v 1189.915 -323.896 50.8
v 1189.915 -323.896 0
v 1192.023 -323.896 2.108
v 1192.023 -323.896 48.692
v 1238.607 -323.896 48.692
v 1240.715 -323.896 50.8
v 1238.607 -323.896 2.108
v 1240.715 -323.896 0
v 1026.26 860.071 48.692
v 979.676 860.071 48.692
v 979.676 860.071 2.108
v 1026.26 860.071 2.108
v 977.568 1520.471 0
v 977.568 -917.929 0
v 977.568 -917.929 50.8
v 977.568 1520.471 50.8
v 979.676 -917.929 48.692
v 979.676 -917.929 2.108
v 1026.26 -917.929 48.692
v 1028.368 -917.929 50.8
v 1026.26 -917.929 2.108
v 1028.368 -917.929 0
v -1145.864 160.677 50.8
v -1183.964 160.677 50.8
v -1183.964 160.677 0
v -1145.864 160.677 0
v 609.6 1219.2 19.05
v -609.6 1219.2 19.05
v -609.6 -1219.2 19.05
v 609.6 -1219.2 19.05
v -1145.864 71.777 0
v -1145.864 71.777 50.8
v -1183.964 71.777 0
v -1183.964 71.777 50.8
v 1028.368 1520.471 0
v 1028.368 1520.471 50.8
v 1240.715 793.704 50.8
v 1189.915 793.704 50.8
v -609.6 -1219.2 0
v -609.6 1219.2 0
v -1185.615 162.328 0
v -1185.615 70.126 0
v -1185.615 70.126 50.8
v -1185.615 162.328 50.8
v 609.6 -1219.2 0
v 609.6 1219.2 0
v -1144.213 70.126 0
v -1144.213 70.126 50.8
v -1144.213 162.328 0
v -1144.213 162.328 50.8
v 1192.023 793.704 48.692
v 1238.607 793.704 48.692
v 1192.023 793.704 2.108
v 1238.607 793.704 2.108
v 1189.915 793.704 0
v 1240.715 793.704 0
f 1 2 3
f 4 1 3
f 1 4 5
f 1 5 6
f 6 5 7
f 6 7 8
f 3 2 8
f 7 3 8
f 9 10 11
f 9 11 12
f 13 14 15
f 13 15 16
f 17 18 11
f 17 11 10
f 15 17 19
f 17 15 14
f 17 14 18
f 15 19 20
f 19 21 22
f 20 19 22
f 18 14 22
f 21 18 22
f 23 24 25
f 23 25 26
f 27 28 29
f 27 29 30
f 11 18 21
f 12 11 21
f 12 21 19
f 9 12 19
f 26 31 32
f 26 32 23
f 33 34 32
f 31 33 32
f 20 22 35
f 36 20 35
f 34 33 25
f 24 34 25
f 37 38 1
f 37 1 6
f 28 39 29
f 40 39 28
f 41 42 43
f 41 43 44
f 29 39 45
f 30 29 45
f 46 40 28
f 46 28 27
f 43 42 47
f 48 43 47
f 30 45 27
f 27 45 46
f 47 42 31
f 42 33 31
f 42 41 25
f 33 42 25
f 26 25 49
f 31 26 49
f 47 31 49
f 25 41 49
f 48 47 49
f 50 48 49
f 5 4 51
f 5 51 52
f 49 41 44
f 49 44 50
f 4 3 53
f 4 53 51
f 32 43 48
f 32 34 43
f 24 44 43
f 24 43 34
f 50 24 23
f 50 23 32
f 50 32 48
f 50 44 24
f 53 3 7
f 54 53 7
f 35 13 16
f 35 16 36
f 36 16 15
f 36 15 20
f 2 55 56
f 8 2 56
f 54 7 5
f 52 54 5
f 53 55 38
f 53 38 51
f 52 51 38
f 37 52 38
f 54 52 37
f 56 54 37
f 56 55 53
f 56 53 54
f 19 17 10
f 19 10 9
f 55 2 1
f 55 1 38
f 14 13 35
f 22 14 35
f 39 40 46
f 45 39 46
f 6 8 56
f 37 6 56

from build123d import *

# Parameters (mm, degrees)
F0_W     = 1219.2
F0_H     = 2438.4
F1_DEPTH = 19.05
F2_W     = 41.402
F2_H     = 92.202
F2_W_2   = 38.1
F2_H_2   = 88.9
F3_DEPTH = 50.8
F4_W     = 50.8
F4_H     = 2438.4
F4_H_2   = 1117.6
F5_DEPTH = 50.8
F6_W     = 46.5836
F6_H     = 46.5836
F7_DEPTH = 1778
F8_W     = 46.5836
F8_H     = 46.5836
F9_DEPTH = 1244.6


with BuildPart() as f1:
    # F0 (on Top) → F1 (new body)
    with BuildSketch(Plane.XY):
        Rectangle(F0_W, F0_H)
    extrude(amount=F1_DEPTH)


with BuildPart() as f3:
    # F2 (on Top) → F3 (new body)
    with BuildSketch(Plane.XY):
        with Locations((-1164.913838, 116.226979)):
            Rectangle(F2_W, F2_H)
        with Locations((-1164.913838, 116.226979)):
            Rectangle(F2_W_2, F2_H_2, mode=Mode.SUBTRACT)
    extrude(amount=F3_DEPTH)


with BuildPart() as f5:
    # F4 (on Top) → F5 (new body)
    with BuildSketch(Plane.XY):
        with Locations((1002.968233, 301.271483)):
            Rectangle(F4_W, F4_H)
        with Locations((1215.314906, 234.904307)):
            Rectangle(F4_W, F4_H_2)
    extrude(amount=F5_DEPTH)

    # F6 (on face) → F7 (cut)
    with BuildSketch(Plane.XZ.offset(917.928517)):
        with Locations((1002.968233, 25.4)):
            Rectangle(F6_W, F6_H)
    extrude(amount=-F7_DEPTH, mode=Mode.SUBTRACT)

    # F8 (on face) → F9 (cut)
    with BuildSketch(Plane.XZ.offset(323.895693)):
        with Locations((1215.314906, 25.4)):
            Rectangle(F8_W, F8_H)
    extrude(amount=-F9_DEPTH, mode=Mode.SUBTRACT)


solid = Compound([f1.part, f3.part, f5.part])
